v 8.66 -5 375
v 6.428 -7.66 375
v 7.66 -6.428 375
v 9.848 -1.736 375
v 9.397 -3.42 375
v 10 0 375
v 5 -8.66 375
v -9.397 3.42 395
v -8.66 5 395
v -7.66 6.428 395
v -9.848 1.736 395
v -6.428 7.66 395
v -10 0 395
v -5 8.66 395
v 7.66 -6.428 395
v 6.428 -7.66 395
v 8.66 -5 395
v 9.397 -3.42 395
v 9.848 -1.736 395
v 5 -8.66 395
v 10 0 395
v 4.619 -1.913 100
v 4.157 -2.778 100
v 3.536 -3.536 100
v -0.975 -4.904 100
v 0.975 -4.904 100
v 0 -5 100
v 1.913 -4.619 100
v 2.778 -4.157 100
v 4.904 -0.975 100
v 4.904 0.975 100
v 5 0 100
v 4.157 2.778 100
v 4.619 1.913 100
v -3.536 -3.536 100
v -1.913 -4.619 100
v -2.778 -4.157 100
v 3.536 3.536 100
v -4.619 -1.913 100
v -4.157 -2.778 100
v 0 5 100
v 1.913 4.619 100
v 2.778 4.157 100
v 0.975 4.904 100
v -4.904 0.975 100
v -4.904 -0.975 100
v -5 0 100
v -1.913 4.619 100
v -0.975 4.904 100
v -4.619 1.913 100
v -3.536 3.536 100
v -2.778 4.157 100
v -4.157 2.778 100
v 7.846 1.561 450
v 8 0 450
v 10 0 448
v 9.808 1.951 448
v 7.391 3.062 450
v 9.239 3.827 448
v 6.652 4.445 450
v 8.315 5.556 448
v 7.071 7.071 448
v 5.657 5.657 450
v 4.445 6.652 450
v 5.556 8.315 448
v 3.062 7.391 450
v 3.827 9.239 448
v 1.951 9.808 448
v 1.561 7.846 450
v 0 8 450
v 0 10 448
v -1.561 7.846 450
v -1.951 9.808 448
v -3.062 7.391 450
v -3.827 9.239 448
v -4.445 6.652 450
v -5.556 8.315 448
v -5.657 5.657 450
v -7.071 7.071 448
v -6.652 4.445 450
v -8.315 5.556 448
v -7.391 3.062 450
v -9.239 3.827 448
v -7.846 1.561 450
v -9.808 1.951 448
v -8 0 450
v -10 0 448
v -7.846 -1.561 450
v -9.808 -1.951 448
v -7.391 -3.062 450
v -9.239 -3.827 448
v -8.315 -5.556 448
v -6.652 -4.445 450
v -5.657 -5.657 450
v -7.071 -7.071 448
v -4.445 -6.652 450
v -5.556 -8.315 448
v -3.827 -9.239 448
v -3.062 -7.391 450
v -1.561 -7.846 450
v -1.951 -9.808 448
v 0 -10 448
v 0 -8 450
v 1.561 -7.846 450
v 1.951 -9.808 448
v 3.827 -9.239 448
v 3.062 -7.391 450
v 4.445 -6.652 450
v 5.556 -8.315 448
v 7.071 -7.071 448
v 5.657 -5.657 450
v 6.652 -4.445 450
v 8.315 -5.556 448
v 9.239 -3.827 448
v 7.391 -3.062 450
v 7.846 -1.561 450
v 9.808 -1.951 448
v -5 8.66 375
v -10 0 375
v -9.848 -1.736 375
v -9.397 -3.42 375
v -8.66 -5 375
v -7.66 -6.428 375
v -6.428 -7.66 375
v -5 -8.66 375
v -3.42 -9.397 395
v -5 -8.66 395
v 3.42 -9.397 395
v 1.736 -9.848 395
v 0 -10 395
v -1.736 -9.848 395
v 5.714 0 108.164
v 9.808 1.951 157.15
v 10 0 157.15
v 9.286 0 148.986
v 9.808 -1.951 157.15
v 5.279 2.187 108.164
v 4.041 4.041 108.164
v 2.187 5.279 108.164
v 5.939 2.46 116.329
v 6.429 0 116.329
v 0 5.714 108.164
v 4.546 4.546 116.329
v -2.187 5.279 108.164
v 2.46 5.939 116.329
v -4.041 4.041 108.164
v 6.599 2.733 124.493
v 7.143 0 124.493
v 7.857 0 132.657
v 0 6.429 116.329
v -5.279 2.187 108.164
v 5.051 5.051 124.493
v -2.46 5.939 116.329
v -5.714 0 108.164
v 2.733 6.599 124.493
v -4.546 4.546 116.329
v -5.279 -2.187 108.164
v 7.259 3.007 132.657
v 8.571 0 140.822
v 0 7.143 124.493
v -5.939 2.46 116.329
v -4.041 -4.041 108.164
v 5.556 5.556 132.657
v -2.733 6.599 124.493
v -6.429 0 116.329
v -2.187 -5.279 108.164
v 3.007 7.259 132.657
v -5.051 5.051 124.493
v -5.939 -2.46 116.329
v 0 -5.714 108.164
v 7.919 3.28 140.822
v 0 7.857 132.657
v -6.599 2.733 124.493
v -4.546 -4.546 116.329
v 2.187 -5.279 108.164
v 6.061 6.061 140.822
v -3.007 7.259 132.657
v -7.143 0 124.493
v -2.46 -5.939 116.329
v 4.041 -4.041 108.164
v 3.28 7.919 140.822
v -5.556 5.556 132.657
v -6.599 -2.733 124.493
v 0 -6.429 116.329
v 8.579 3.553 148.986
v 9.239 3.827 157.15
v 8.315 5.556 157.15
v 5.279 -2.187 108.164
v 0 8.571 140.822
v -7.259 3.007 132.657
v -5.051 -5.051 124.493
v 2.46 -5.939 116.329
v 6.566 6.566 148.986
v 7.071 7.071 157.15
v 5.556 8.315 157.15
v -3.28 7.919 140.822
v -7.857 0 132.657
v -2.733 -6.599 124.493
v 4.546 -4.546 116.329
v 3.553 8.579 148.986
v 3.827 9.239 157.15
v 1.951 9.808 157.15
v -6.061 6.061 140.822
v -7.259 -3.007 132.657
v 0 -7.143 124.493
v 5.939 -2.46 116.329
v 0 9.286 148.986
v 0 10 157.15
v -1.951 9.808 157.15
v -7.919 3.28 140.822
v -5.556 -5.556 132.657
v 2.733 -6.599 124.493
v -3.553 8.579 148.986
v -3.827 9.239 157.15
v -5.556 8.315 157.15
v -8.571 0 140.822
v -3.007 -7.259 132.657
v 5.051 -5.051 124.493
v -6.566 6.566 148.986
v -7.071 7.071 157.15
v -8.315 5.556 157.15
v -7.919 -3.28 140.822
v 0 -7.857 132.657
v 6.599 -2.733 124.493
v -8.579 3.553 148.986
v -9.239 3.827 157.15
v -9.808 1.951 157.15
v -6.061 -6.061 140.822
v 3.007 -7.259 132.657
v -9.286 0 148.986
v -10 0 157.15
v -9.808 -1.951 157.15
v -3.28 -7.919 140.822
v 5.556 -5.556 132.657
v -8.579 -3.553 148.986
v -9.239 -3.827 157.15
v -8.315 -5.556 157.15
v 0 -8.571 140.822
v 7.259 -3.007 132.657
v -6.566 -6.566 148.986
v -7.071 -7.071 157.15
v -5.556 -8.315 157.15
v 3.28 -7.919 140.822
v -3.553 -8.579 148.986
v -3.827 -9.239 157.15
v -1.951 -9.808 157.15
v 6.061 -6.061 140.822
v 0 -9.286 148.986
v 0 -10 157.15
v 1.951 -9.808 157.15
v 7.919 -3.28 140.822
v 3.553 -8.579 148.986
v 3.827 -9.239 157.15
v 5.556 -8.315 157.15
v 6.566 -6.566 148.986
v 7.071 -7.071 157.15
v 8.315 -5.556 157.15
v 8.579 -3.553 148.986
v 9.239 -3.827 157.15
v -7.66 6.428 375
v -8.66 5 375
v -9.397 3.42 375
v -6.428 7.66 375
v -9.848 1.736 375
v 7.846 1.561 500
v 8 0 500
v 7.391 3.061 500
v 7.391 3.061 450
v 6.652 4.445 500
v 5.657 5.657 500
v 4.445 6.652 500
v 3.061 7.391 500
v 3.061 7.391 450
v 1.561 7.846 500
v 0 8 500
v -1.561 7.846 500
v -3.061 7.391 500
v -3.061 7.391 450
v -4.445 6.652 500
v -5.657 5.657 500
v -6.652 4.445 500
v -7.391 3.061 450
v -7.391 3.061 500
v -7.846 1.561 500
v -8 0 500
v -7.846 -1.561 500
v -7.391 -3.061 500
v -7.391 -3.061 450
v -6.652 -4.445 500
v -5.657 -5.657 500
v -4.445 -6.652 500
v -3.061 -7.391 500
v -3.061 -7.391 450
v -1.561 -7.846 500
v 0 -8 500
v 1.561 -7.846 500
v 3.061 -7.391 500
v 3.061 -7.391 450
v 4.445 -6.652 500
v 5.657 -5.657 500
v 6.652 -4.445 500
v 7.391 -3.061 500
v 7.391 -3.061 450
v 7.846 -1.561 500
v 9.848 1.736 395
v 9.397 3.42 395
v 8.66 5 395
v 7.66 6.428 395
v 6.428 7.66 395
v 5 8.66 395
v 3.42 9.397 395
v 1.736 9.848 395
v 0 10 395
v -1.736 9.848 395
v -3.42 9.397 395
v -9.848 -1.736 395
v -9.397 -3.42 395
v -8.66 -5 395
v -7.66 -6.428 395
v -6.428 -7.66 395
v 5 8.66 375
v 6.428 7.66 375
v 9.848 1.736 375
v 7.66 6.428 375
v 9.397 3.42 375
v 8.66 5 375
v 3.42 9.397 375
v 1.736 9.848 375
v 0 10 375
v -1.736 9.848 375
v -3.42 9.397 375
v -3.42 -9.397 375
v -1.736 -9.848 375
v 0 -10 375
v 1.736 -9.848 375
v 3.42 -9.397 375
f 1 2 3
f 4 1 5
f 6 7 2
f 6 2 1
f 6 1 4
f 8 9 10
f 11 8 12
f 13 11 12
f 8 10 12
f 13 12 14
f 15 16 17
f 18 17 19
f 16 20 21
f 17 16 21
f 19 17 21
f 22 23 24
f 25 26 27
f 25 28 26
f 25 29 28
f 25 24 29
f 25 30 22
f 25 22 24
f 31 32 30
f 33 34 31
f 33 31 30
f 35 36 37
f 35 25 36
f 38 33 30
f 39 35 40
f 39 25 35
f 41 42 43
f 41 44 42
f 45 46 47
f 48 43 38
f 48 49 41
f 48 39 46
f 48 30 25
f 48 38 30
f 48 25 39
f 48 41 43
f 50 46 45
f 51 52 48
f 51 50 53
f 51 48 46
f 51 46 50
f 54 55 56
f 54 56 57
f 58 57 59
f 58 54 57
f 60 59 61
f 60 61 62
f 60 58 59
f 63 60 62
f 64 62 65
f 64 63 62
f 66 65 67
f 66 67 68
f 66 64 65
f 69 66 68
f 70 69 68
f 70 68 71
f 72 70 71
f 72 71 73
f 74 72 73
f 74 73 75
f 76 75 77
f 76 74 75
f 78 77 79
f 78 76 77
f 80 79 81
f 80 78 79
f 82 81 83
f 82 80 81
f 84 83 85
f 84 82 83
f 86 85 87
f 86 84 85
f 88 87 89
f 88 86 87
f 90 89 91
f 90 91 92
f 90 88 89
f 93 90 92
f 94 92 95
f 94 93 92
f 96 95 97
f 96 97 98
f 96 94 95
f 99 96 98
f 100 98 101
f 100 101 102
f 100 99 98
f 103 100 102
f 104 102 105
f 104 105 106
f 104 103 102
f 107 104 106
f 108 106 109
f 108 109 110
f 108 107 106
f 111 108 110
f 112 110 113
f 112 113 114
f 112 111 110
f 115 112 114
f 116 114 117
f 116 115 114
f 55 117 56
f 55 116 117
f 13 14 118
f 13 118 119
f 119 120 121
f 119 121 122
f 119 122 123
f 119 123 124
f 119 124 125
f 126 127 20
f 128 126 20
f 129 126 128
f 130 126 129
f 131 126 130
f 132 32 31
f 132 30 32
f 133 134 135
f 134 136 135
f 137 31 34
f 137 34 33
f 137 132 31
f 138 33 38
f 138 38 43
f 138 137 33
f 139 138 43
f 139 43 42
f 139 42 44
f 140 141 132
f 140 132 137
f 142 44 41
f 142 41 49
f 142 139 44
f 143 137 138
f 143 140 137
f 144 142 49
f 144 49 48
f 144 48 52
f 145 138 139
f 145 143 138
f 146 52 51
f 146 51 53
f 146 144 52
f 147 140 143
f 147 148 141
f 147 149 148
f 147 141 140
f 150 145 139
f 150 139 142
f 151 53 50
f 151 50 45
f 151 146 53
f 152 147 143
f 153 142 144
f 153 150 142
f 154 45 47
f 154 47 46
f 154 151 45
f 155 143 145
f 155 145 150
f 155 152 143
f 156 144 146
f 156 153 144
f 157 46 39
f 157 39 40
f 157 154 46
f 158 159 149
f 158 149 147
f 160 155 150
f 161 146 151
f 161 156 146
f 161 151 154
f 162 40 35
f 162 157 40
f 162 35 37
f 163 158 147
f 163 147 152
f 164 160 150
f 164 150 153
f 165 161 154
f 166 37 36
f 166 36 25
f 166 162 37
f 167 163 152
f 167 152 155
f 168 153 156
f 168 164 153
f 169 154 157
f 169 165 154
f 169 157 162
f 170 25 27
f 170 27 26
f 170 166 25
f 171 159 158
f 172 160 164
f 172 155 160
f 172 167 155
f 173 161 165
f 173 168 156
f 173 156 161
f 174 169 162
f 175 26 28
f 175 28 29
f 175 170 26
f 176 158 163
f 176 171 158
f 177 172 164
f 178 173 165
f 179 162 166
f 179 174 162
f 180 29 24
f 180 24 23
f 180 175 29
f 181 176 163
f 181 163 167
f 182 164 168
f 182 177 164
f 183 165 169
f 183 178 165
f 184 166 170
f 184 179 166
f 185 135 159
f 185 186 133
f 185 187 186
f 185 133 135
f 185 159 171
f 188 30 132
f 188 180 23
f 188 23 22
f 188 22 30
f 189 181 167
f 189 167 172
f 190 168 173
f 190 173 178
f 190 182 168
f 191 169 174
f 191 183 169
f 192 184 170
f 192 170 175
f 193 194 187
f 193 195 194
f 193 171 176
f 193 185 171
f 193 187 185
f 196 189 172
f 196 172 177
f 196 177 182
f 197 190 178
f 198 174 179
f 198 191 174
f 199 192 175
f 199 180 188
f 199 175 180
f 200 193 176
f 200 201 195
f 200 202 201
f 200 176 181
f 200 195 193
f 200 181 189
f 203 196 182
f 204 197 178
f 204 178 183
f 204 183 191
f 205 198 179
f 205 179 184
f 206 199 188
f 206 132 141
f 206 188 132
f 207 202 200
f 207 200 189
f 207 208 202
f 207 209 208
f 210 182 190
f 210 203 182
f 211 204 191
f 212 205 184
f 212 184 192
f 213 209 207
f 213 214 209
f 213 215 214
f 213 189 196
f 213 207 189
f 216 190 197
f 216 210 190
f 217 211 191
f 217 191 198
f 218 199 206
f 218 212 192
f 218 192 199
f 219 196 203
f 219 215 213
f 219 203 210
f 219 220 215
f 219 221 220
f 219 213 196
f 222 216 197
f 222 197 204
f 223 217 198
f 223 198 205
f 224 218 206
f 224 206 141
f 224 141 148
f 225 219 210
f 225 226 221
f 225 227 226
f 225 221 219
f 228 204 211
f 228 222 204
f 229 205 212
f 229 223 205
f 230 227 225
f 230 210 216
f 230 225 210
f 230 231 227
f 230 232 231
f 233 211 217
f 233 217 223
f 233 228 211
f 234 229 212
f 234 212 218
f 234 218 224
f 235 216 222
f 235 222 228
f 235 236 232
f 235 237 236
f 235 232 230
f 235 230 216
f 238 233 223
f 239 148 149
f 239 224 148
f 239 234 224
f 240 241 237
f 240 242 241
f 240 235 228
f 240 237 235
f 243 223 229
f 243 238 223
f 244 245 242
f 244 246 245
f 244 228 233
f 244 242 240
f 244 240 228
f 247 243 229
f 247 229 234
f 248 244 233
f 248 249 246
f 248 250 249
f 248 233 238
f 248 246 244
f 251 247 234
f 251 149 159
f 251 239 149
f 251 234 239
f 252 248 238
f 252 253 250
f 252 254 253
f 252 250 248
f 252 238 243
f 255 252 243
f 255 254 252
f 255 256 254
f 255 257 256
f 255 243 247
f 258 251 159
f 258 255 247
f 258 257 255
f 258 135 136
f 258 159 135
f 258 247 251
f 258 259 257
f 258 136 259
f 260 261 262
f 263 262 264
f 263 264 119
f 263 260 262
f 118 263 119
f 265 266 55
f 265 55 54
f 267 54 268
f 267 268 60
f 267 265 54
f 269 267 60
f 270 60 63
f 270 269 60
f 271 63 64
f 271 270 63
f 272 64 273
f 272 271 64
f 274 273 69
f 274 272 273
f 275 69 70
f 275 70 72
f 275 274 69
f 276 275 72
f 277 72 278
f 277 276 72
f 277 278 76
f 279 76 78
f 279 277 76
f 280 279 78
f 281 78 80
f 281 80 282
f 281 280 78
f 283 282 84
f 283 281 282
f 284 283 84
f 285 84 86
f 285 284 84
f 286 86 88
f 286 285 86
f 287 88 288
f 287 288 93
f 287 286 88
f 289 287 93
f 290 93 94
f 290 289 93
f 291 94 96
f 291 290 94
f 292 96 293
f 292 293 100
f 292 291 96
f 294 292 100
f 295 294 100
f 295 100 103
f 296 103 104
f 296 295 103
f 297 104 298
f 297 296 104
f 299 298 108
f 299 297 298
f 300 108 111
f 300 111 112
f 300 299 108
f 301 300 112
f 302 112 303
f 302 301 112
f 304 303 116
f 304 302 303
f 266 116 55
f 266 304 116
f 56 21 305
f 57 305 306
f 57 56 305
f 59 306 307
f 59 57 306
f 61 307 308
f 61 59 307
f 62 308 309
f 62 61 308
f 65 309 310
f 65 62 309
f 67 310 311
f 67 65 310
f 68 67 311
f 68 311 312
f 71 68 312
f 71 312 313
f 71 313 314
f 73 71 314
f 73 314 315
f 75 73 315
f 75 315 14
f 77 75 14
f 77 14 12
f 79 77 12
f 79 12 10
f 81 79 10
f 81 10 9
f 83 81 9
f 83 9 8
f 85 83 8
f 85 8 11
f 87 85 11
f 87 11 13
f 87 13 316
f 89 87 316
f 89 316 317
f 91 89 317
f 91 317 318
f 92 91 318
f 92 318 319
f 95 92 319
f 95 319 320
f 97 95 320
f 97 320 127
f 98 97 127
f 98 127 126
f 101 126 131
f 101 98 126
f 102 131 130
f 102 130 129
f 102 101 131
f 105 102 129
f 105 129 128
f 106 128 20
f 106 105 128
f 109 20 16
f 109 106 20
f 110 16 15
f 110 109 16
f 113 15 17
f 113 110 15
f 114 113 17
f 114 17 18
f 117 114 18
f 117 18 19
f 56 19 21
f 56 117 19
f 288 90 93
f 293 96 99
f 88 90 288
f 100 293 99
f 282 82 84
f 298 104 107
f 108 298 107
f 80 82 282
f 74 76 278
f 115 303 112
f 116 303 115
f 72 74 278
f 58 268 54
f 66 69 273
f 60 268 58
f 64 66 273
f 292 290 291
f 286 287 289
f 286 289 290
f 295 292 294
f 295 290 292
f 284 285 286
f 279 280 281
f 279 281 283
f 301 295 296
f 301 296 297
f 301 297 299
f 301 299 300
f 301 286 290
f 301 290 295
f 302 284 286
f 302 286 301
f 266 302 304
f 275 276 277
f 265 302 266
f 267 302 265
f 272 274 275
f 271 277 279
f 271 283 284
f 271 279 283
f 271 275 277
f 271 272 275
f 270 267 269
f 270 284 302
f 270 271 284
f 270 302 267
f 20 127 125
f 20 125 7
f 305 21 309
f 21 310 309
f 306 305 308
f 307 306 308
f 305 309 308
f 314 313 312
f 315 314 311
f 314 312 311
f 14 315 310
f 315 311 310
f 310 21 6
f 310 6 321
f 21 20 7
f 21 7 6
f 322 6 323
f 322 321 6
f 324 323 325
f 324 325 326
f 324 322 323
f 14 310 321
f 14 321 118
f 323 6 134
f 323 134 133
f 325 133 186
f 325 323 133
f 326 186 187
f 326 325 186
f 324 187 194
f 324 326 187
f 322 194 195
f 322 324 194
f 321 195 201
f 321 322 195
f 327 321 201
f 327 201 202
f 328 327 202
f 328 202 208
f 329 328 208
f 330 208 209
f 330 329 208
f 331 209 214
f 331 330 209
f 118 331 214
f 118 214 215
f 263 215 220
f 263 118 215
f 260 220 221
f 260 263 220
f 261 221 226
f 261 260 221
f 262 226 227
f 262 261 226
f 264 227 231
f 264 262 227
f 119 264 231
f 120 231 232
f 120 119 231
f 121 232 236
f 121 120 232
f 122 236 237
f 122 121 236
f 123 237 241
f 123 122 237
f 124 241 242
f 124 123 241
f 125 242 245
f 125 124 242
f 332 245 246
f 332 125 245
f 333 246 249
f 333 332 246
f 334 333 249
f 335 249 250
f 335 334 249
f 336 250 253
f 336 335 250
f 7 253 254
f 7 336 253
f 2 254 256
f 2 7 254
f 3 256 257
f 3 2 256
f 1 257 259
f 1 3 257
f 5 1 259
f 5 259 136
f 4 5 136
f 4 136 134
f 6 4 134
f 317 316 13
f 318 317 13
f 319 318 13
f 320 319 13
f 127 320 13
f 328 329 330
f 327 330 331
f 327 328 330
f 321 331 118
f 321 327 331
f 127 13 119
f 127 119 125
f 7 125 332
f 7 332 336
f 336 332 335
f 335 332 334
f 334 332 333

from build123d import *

# Parameters (mm, degrees)
SKETCH1_R          = 10
EXTRUDE1_DEPTH     = 500
CHAMFER1_SIZE      = 2
SKETCH2_R          = 43.013092774
SKETCH2_R_2        = 8
CUT_EXTRUDE1_DEPTH = 50
CHAMFER2_SIZE      = 2
SKETCH3_R          = 224.622331413
REMOVE_DEPTH       = 600
SKETCH4_R          = 20
HEX_2_DEPTH        = 20
CHAMFER3_SIZE      = 5
CHAMFER3_SIZE2     = 57.150261514


with BuildPart() as part:
    # Sketch1 → Extrude1 (new, symmetric)
    with BuildSketch(Plane.XY):
        Circle(SKETCH1_R)
    extrude(amount=EXTRUDE1_DEPTH, both=True)

    # Chamfer1
    chamfer1_edges = [part.edges().sort_by_distance(p)[0] for p in [
        (-10, 0, -500),
        (-10, 0, 500),
    ]]
    chamfer(chamfer1_edges, length=CHAMFER1_SIZE)

    # Sketch2 → Cut-Extrude1 (cut)
    with BuildSketch(Plane.XY.offset(500)):
        Circle(SKETCH2_R)
        Circle(SKETCH2_R_2, mode=Mode.SUBTRACT)
    extrude(amount=-CUT_EXTRUDE1_DEPTH, mode=Mode.SUBTRACT)

    # Chamfer2
    chamfer2_edges = [part.edges().sort_by_distance(p)[0] for p in [
        (-10, 0, 450),
    ]]
    chamfer(chamfer2_edges, length=CHAMFER2_SIZE - 0.0001)  # a hair under: the kernel refuses the full size

    # Sketch3 → remove (cut)
    with BuildSketch(Plane(origin=(0, 0, -500), x_dir=(-1, 0, 0), z_dir=(0, 0, -1))):
        Circle(SKETCH3_R)
    extrude(amount=-REMOVE_DEPTH, mode=Mode.SUBTRACT)

    # Sketch4 → hex 2 (cut)
    with BuildSketch(Plane.XY.offset(395)):
        Circle(SKETCH4_R)
        Polygon((5, 8.660254038), (-5, 8.660254038), (-10, 0), (-5, -8.660254038), (5, -8.660254038), (10, 0), align=None, mode=Mode.SUBTRACT)
    extrude(amount=-HEX_2_DEPTH, mode=Mode.SUBTRACT)

    # Chamfer3
    chamfer3_edges = [part.edges().sort_by_distance(p)[0] for p in [
        (-10, 0, 100),
    ]]
    chamfer3_side = [part.faces().sort_by_distance(p)[0] for p in [
        (0, 0, 100),
    ]]
    chamfer(chamfer3_edges, length=CHAMFER3_SIZE, length2=CHAMFER3_SIZE2, reference=chamfer3_side[0])


solid = part.part
